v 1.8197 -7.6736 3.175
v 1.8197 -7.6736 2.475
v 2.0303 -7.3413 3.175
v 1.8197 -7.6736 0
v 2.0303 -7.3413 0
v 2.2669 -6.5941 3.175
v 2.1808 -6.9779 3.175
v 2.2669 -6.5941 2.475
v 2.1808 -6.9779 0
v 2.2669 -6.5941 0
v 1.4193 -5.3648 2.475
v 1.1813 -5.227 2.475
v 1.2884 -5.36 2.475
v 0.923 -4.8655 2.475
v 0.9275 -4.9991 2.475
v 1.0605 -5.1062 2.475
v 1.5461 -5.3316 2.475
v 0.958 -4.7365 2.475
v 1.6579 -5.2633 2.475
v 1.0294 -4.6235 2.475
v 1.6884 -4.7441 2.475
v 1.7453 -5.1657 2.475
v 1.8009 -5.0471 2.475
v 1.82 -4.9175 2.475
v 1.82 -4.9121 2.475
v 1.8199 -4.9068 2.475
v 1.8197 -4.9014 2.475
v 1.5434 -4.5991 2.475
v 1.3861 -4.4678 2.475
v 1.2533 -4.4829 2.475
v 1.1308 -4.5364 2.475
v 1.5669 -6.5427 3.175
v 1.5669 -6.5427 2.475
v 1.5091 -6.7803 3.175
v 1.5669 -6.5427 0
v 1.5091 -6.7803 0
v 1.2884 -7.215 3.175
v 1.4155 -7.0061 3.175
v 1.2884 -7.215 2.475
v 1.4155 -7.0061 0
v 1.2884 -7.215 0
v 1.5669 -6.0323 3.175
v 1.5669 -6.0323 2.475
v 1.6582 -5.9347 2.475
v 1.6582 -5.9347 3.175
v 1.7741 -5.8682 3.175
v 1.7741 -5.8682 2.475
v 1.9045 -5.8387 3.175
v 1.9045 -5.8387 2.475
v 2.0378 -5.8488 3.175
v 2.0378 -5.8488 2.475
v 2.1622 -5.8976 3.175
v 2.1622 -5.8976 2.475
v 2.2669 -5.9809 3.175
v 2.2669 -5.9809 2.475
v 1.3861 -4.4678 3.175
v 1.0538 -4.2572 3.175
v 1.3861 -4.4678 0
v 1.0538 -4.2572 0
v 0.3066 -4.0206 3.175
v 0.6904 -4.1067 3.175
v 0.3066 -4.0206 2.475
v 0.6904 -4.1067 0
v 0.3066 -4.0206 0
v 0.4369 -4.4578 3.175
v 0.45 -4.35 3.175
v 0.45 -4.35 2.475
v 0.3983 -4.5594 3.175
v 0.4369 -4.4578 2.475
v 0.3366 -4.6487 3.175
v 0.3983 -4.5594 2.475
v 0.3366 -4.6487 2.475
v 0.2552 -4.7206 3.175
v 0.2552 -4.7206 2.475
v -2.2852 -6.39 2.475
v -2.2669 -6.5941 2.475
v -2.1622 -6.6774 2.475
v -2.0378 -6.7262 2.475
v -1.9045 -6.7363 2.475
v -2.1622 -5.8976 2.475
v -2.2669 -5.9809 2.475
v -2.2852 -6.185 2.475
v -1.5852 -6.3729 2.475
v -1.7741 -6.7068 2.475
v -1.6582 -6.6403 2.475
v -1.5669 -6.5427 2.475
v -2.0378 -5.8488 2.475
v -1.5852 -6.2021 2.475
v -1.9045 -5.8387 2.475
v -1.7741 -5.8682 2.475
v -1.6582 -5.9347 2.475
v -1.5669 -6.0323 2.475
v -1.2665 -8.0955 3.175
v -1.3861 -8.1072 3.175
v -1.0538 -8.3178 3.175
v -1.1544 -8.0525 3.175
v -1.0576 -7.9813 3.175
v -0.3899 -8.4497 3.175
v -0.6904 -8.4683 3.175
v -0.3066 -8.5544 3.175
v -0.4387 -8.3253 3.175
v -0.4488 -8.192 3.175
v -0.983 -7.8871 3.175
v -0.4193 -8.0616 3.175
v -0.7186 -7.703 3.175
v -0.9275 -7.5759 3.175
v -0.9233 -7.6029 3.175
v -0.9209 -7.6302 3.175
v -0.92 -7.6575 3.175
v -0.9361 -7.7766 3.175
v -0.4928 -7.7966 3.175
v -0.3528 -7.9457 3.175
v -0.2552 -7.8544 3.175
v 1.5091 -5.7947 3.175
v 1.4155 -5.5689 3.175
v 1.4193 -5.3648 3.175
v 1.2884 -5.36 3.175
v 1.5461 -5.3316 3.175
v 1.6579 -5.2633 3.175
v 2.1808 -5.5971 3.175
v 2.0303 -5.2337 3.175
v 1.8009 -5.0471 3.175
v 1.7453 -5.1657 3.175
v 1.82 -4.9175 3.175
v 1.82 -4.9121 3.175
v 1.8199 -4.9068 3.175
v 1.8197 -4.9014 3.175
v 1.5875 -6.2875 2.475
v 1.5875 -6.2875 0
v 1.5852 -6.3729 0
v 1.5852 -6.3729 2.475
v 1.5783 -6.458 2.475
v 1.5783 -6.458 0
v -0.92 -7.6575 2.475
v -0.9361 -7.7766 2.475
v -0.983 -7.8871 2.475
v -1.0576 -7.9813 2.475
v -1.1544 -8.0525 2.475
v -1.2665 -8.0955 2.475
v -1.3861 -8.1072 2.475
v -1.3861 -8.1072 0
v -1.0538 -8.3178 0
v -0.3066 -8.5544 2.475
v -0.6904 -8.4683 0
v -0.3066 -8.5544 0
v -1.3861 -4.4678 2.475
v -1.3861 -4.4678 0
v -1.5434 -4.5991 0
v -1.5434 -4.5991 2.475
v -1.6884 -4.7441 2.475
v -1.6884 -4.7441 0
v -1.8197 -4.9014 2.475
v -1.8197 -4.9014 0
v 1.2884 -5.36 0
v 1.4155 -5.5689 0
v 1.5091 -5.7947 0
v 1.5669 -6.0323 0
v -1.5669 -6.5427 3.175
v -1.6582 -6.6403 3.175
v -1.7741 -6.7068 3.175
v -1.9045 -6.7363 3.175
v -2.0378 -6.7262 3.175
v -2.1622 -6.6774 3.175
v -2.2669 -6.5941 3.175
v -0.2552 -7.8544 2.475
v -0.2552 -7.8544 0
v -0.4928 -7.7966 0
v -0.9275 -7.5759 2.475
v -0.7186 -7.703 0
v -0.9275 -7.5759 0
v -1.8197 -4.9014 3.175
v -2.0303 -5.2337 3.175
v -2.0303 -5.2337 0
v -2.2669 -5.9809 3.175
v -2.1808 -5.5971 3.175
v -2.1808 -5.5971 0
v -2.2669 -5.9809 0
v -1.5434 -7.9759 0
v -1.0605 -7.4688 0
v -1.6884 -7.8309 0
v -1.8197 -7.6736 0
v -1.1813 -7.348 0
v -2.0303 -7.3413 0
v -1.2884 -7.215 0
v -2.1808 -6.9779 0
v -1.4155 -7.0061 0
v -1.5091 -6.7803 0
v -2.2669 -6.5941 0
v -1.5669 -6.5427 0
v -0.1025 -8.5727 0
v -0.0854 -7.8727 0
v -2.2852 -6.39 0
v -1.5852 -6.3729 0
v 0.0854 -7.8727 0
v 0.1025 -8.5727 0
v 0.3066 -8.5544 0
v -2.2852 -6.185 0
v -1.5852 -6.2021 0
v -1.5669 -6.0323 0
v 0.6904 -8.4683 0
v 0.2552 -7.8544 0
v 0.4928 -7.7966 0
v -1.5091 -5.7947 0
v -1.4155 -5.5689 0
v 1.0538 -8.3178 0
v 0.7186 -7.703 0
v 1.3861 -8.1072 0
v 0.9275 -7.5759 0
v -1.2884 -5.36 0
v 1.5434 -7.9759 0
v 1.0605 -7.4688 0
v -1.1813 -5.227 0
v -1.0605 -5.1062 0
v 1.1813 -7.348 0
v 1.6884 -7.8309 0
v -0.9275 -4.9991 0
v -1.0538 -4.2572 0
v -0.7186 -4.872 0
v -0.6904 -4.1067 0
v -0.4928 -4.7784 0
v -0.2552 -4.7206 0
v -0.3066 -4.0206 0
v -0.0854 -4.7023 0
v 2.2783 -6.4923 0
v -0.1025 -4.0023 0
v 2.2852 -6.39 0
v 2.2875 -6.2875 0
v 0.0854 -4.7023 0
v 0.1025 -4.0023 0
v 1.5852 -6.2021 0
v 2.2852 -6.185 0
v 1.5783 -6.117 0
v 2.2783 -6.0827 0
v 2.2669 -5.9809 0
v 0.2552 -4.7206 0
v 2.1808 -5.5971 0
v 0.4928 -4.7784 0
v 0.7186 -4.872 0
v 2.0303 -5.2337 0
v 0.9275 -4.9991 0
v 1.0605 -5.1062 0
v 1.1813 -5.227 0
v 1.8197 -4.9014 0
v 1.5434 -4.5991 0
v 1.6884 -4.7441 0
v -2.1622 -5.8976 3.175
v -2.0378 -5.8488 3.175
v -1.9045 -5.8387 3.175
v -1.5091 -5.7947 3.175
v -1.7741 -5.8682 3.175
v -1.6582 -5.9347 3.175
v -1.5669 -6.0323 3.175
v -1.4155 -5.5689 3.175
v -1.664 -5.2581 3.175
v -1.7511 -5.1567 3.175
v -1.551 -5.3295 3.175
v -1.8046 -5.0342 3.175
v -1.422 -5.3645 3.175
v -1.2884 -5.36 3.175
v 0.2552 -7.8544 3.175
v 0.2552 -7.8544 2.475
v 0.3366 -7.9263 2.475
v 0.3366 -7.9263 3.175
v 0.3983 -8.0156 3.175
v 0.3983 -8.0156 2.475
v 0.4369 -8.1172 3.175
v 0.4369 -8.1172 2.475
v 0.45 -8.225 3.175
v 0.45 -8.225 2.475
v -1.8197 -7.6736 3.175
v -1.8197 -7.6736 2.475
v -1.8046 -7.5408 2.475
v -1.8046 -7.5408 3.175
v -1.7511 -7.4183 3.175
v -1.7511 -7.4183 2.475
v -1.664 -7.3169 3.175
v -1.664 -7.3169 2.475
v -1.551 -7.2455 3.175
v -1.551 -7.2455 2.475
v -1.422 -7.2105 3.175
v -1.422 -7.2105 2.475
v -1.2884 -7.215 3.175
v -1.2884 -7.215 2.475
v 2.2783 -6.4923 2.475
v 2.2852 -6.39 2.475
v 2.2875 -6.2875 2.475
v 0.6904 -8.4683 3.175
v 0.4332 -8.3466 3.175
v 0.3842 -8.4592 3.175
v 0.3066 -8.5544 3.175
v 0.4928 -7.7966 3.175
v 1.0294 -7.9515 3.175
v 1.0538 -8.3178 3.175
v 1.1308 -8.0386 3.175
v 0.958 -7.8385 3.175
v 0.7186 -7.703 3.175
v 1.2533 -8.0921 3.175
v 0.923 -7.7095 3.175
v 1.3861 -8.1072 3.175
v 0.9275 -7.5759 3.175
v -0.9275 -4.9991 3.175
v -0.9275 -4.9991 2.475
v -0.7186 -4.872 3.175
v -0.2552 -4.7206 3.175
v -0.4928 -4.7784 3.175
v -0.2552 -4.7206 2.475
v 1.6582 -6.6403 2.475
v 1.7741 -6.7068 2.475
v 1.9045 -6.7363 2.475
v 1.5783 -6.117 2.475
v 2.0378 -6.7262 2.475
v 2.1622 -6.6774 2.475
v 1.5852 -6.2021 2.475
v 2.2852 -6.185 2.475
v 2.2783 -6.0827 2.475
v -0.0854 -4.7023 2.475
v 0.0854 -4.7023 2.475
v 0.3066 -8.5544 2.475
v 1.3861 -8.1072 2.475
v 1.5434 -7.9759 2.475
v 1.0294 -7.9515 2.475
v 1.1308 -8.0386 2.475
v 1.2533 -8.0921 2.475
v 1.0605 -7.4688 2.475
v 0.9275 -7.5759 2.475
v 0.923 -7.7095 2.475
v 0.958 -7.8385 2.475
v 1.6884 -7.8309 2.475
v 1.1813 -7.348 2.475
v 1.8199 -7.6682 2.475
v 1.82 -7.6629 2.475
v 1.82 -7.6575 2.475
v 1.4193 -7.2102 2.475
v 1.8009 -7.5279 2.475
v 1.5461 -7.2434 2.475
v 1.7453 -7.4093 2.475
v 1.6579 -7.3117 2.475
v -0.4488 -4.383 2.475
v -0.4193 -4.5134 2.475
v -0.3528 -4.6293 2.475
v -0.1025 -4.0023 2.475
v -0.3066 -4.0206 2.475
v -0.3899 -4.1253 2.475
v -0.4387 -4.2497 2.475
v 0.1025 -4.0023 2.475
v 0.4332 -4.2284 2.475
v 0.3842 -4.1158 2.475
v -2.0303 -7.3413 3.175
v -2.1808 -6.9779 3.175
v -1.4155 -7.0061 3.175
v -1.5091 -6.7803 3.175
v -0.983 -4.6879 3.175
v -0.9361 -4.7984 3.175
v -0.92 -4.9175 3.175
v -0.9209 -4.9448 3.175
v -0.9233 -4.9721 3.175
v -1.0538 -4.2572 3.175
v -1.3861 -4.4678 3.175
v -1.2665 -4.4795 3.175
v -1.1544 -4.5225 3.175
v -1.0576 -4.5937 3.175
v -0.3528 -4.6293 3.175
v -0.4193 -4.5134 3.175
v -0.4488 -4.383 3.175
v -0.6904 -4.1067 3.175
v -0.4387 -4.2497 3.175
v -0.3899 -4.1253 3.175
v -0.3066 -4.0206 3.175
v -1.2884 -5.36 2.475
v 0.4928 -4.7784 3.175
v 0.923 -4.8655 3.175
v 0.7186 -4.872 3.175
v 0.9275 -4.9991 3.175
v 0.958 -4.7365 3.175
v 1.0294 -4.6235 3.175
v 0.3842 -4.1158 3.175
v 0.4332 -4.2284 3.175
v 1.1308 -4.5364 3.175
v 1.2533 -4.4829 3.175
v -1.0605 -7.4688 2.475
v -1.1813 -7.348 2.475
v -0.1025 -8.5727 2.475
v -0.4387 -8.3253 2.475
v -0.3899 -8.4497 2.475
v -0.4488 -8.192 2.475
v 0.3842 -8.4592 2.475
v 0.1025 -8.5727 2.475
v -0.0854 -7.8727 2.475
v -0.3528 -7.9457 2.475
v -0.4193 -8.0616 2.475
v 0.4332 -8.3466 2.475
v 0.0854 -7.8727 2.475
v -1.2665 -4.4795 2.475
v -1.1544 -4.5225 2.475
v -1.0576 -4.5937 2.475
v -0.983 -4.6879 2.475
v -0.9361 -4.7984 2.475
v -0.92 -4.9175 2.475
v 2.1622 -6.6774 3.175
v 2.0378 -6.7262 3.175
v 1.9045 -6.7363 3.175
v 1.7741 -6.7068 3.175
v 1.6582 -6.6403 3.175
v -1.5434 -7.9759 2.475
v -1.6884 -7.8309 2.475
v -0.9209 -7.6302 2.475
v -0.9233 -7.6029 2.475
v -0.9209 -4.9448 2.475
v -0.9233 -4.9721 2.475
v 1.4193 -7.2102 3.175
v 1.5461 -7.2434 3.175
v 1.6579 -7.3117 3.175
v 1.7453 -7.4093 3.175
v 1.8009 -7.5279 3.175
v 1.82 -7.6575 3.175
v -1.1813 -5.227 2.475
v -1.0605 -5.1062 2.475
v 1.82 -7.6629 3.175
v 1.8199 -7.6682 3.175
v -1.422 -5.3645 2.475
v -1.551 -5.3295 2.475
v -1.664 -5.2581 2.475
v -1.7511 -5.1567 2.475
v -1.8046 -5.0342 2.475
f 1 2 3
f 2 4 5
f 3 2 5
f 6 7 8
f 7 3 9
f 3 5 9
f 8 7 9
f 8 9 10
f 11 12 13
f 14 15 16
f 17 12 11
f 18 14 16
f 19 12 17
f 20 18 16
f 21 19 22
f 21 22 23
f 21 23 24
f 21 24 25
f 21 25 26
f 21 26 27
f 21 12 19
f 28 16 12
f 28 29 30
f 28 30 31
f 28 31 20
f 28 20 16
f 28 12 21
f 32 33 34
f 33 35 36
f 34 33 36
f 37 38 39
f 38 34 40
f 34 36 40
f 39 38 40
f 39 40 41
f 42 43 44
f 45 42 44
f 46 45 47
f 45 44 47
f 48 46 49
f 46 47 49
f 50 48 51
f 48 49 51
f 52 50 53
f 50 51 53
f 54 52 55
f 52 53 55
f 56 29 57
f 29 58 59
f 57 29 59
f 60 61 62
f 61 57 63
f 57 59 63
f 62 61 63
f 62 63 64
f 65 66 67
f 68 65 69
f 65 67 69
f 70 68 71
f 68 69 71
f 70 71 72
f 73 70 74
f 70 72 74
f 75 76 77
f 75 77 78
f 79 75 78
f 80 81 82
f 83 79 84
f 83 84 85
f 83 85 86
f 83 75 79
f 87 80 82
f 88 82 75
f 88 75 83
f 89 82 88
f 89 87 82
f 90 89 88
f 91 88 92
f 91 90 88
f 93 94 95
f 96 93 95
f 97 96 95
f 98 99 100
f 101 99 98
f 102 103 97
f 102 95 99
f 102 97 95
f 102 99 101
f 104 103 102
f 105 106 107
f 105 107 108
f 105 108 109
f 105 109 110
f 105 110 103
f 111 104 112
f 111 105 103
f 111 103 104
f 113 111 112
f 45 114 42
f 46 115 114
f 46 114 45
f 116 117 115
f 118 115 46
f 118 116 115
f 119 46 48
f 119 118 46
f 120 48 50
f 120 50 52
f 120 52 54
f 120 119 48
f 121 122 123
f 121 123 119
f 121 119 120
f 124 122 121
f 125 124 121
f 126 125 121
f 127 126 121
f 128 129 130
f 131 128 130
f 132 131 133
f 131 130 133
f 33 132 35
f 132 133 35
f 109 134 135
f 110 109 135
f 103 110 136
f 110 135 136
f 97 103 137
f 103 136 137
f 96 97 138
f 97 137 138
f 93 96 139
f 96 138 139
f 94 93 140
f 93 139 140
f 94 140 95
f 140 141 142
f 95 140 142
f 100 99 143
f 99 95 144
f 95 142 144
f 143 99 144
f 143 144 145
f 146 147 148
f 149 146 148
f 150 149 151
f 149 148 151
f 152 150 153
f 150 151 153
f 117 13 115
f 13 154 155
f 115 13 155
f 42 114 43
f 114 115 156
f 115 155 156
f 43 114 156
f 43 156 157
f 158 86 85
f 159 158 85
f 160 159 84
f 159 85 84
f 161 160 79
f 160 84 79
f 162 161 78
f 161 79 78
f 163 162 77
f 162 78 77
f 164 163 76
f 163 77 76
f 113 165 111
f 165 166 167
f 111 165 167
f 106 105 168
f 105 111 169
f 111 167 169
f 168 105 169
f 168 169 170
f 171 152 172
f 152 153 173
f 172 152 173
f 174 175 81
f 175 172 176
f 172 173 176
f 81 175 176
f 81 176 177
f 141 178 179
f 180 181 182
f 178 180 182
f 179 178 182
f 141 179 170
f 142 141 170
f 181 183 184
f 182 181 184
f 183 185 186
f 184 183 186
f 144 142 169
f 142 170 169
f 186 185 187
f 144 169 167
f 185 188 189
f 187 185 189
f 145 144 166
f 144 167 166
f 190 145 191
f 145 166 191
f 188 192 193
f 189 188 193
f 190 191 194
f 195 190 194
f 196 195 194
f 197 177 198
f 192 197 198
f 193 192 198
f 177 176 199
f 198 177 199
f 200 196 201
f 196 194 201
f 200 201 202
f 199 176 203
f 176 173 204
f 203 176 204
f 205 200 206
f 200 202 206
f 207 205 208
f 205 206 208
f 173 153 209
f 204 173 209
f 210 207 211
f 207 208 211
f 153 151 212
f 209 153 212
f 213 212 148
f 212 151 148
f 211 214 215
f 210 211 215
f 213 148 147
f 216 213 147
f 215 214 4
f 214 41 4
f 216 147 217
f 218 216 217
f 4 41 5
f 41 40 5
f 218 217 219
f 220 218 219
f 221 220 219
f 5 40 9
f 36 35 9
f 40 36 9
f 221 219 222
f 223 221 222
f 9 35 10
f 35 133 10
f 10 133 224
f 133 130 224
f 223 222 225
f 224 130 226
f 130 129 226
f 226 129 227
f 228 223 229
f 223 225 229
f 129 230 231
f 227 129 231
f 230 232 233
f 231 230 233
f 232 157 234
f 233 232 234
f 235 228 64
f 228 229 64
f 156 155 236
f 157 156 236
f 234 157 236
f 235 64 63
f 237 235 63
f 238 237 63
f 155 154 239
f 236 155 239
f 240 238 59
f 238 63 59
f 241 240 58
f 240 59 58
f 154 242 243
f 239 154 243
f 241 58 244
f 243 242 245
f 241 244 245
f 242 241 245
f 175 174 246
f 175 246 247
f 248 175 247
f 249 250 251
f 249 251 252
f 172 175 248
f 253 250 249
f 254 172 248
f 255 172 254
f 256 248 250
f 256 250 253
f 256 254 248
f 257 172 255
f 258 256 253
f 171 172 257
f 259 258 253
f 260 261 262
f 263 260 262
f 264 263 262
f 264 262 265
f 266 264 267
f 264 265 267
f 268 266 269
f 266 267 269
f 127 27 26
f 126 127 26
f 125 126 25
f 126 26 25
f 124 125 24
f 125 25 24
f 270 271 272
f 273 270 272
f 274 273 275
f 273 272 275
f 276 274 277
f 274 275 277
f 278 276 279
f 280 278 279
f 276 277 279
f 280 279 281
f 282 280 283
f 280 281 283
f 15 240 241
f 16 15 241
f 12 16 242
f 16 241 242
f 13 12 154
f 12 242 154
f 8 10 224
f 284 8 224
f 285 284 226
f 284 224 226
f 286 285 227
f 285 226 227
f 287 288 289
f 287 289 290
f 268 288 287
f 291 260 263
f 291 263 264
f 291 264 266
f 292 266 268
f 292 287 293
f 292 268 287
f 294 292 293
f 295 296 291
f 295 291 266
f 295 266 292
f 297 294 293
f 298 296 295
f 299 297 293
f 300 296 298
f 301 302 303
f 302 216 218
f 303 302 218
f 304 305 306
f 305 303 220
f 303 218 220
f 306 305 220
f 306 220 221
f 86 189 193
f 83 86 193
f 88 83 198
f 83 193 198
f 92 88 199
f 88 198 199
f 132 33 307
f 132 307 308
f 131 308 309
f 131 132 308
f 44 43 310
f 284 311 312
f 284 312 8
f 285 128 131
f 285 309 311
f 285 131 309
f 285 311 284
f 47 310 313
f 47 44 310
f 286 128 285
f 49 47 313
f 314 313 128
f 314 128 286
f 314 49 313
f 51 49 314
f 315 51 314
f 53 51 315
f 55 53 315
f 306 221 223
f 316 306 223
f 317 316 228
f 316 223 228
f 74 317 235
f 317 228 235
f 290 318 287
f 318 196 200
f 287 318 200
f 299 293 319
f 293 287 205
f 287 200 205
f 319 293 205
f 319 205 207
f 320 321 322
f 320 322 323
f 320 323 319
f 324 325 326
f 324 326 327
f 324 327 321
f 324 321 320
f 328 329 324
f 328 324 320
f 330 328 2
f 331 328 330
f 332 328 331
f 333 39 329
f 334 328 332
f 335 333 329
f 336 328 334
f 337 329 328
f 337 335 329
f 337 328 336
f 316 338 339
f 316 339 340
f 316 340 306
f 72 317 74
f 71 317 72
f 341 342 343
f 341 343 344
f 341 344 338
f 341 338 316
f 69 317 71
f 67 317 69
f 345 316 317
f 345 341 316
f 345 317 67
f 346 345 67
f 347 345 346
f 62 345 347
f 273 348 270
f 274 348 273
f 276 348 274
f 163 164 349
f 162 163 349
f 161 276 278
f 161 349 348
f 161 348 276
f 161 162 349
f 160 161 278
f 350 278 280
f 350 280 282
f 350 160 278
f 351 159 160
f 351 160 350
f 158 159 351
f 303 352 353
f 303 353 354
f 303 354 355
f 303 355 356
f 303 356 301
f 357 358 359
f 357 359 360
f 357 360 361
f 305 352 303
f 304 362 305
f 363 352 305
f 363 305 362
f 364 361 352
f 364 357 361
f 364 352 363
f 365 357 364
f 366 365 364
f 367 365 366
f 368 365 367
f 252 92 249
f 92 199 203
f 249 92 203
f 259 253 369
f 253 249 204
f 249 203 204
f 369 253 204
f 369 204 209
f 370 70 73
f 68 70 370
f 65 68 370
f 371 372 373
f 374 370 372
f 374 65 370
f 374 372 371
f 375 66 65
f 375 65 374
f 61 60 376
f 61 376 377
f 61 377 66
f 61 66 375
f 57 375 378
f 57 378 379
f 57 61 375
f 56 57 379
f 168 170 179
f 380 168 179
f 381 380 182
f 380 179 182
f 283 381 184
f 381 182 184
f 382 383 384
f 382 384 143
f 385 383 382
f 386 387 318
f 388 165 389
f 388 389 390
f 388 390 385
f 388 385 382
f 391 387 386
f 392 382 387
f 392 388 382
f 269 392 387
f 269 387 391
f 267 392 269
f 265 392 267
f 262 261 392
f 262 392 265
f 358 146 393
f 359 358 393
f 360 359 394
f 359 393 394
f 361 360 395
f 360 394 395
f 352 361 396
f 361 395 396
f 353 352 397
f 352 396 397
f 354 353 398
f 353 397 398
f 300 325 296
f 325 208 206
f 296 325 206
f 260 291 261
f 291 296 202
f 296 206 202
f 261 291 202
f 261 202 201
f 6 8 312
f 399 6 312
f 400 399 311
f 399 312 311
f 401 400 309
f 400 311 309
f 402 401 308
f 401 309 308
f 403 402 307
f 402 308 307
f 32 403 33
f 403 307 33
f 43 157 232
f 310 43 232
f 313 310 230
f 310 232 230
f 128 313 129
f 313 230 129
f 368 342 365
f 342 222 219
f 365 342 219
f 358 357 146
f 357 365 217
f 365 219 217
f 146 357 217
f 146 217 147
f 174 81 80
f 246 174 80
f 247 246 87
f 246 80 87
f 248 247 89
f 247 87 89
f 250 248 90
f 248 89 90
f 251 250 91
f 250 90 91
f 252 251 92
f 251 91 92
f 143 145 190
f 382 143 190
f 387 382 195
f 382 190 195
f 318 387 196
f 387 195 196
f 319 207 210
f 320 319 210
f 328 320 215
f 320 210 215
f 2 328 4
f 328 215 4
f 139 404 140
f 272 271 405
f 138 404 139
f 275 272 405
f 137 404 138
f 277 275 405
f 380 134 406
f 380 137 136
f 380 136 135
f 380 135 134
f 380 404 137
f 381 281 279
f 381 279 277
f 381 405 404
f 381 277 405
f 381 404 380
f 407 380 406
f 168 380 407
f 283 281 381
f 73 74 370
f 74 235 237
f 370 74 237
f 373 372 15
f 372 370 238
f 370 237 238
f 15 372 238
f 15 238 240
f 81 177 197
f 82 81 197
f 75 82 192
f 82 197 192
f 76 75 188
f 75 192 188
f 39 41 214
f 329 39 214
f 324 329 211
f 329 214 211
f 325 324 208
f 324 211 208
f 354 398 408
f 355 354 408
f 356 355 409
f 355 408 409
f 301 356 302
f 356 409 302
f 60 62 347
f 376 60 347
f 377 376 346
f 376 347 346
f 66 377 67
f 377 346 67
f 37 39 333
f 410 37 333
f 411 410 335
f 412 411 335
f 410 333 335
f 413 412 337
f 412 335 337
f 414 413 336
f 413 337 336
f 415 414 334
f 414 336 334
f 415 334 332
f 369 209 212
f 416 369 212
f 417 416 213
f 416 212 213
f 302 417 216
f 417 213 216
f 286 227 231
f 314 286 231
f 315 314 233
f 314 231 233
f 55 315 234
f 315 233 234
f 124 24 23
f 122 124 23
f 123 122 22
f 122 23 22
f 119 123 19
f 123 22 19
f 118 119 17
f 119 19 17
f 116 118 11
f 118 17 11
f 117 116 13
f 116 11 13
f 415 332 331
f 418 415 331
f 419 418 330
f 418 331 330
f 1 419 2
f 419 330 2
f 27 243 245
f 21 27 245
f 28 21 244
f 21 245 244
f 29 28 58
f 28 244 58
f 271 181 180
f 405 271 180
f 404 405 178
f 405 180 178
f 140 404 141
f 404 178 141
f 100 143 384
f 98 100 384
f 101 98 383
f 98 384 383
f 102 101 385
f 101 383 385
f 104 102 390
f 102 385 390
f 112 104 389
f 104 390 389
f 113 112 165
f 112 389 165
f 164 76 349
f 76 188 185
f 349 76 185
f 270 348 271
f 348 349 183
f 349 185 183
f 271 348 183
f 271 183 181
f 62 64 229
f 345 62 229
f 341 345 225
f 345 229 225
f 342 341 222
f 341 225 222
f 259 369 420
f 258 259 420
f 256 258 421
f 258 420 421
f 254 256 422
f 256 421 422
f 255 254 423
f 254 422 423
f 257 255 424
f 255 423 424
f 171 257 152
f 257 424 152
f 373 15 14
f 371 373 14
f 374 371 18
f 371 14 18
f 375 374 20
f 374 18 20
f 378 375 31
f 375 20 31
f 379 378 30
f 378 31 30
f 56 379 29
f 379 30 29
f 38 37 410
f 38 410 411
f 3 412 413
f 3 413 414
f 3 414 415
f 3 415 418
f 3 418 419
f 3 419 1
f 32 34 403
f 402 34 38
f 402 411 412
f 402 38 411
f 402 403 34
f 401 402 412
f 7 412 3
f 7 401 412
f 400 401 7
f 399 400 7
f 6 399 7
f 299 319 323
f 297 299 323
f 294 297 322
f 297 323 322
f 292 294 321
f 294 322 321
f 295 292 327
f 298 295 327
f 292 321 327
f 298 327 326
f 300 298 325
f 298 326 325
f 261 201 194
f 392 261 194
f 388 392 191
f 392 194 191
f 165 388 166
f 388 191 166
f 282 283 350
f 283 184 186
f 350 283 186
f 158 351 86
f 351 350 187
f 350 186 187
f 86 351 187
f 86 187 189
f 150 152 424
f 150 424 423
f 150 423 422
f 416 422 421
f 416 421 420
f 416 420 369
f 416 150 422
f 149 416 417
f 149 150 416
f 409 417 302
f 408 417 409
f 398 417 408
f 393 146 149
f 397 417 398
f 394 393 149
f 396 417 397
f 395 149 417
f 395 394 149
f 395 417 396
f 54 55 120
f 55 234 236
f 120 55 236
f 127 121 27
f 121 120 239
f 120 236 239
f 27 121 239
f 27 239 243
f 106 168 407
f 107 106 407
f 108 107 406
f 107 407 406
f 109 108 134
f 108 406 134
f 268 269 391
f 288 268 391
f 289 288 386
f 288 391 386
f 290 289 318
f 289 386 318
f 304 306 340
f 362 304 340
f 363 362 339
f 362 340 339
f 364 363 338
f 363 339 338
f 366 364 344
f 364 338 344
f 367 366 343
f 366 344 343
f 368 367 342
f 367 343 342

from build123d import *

# Parameters (mm, degrees)
F1_DEPTH = 3.175
F2_DEPTH = 2.475


# Not quite as in the source:
# - a length typed as a fraction of an inch, garbled in the dataset ("3 / 203.2 mm" for 3/8 in), is restored


with BuildPart() as f1:
    # F0 (on Top) → F1 (new body)
    with BuildSketch(Plane.XY):
        with BuildLine():
            ThreePointArc((-1.5668548387, -6.0323095527), (-1.4666587579, -5.6799900511), (-1.2883805774, -5.3600132142))
            ThreePointArc((-1.2883805774, -5.3600132142), (-1.6640391224, -5.2581452502), (-1.8197325394, -4.9014156826))
            ThreePointArc((-1.8197325394, -4.9014156826), (-2.1133744306, -5.4121116485), (-2.2668548387, -5.9808644016))
            ThreePointArc((-2.2668548387, -5.9808644016), (-1.9045170714, -5.8387103762), (-1.5668548387, -6.0323095527))
        make_face()
    extrude(amount=F1_DEPTH)



with BuildPart() as f1b:
    # F0 (on Top) → F1, piece 2 (new body)
    with BuildSketch(Plane.XY):
        with BuildLine():
            ThreePointArc((-0.9274867858, -4.9991194226), (-0.6075099489, -4.8208412421), (-0.2551904473, -4.7206451613))
            ThreePointArc((-0.2551904473, -4.7206451613), (-0.4487896238, -4.3829829286), (-0.3066355984, -4.0206451613))
            ThreePointArc((-0.3066355984, -4.0206451613), (-0.8753883515, -4.1741255694), (-1.3860843174, -4.4677674606))
            ThreePointArc((-1.3860843174, -4.4677674606), (-1.0575527647, -4.5936525568), (-0.9200193885, -4.9174806115))
            ThreePointArc((-0.9200193885, -4.9174806115), (-0.9218901264, -4.9584704197), (-0.9274867858, -4.9991194226))
        make_face()
    extrude(amount=F1_DEPTH)


with BuildPart() as f1c:
    # F0 (on Top) → F1, piece 3 (new body)
    with BuildSketch(Plane.XY):
        with BuildLine():
            ThreePointArc((0.2551904473, -4.7206451613), (0.6075099489, -4.8208412421), (0.9274867858, -4.9991194226))
            ThreePointArc((0.9274867858, -4.9991194226), (1.0293547498, -4.6234608776), (1.3860843174, -4.4677674606))
            ThreePointArc((1.3860843174, -4.4677674606), (0.8753883515, -4.1741255694), (0.3066355984, -4.0206451613))
            ThreePointArc((0.3066355984, -4.0206451613), (0.4126051498, -4.1703976883), (0.45, -4.35))
            ThreePointArc((0.45, -4.35), (0.3983313328, -4.559361289), (0.2551904473, -4.7206451613))
        make_face()
    extrude(amount=F1_DEPTH)


with BuildPart() as f1d:
    # F0 (on Top) → F1, piece 4 (new body)
    with BuildSketch(Plane.XY):
        with BuildLine():
            ThreePointArc((1.2883805774, -5.3600132142), (1.4666587579, -5.6799900511), (1.5668548387, -6.0323095527))
            ThreePointArc((1.5668548387, -6.0323095527), (1.9045170714, -5.8387103762), (2.2668548387, -5.9808644016))
            ThreePointArc((2.2668548387, -5.9808644016), (2.1133744306, -5.4121116485), (1.8197325394, -4.9014156826))
            ThreePointArc((1.8197325394, -4.9014156826), (1.8199476706, -4.9094468667), (1.8200193885, -4.9174806115))
            ThreePointArc((1.8200193885, -4.9174806115), (1.6579104573, -5.2633400229), (1.2883805774, -5.3600132142))
        make_face()
    extrude(amount=F1_DEPTH)


with BuildPart() as f1e:
    # F0 (on Top) → F1, piece 5 (new body)
    with BuildSketch(Plane.XY):
        with BuildLine():
            ThreePointArc((2.2668548387, -6.5941355984), (1.9045170714, -6.7362896238), (1.5668548387, -6.5426904473))
            ThreePointArc((1.5668548387, -6.5426904473), (1.4666587579, -6.8950099489), (1.2883805774, -7.2149867858))
            ThreePointArc((1.2883805774, -7.2149867858), (1.6579104573, -7.3116599771), (1.8200193885, -7.6575193885))
            ThreePointArc((1.8200193885, -7.6575193885), (1.8199476706, -7.6655531333), (1.8197325394, -7.6735843174))
            ThreePointArc((1.8197325394, -7.6735843174), (2.1133744306, -7.1628883515), (2.2668548387, -6.5941355984))
        make_face()
    extrude(amount=F1_DEPTH)


with BuildPart() as f1f:
    # F0 (on Top) → F1, piece 6 (new body)
    with BuildSketch(Plane.XY):
        with BuildLine():
            ThreePointArc((1.3860843174, -8.1072325394), (1.0293547498, -7.9515391224), (0.9274867858, -7.5758805774))
            ThreePointArc((0.9274867858, -7.5758805774), (0.6075099489, -7.7541587579), (0.2551904473, -7.8543548387))
            ThreePointArc((0.2551904473, -7.8543548387), (0.3983313328, -8.015638711), (0.45, -8.225))
            ThreePointArc((0.45, -8.225), (0.4126051498, -8.4046023117), (0.3066355984, -8.5543548387))
            ThreePointArc((0.3066355984, -8.5543548387), (0.8753883515, -8.4008744306), (1.3860843174, -8.1072325394))
        make_face()
    extrude(amount=F1_DEPTH)


with BuildPart() as f1g:
    # F0 (on Top) → F1, piece 7 (new body)
    with BuildSketch(Plane.XY):
        with BuildLine():
            ThreePointArc((-0.3066355984, -8.5543548387), (-0.4487896238, -8.1920170714), (-0.2551904473, -7.8543548387))
            ThreePointArc((-0.2551904473, -7.8543548387), (-0.6075099489, -7.7541587579), (-0.9274867858, -7.5758805774))
            ThreePointArc((-0.9274867858, -7.5758805774), (-0.9218901264, -7.6165295803), (-0.9200193885, -7.6575193885))
            ThreePointArc((-0.9200193885, -7.6575193885), (-1.0575527647, -7.9813474432), (-1.3860843174, -8.1072325394))
            ThreePointArc((-1.3860843174, -8.1072325394), (-0.8753883515, -8.4008744306), (-0.3066355984, -8.5543548387))
        make_face()
    extrude(amount=F1_DEPTH)


with BuildPart() as f1h:
    # F0 (on Top) → F1, piece 8 (new body)
    with BuildSketch(Plane.XY):
        with BuildLine():
            ThreePointArc((-1.8197325394, -7.6735843174), (-1.6640391224, -7.3168547498), (-1.2883805774, -7.2149867858))
            ThreePointArc((-1.2883805774, -7.2149867858), (-1.4666587579, -6.8950099489), (-1.5668548387, -6.5426904473))
            ThreePointArc((-1.5668548387, -6.5426904473), (-1.9045170714, -6.7362896238), (-2.2668548387, -6.5941355984))
            ThreePointArc((-2.2668548387, -6.5941355984), (-2.1133744306, -7.1628883515), (-1.8197325394, -7.6735843174))
        make_face()
    extrude(amount=F1_DEPTH)


with BuildPart() as f1_1:
    add(f1.part)

    add(f1b.part)  # F2 merges F1b

    add(f1c.part)  # F2 merges F1c

    add(f1d.part)  # F2 merges F1d

    add(f1e.part)  # F2 merges F1e

    add(f1f.part)  # F2 merges F1f

    add(f1g.part)  # F2 merges F1g

    add(f1h.part)  # F2 merges F1h
    # F0 (on Top) → F2 (join)
    with BuildSketch(Plane.XY):
        with BuildLine():
            ThreePointArc((-1.2883805774, -5.3600132142), (-1.1225320151, -5.1649679849), (-0.9274867858, -4.9991194226))
            ThreePointArc((-0.9274867858, -4.9991194226), (-0.9218901264, -4.9584704197), (-0.9200193885, -4.9174806115))
            ThreePointArc((-0.9200193885, -4.9174806115), (-1.0575527647, -4.5936525568), (-1.3860843174, -4.4677674606))
            ThreePointArc((-1.3860843174, -4.4677674606), (-1.617506762, -4.669993238), (-1.8197325394, -4.9014156826))
            ThreePointArc((-1.8197325394, -4.9014156826), (-1.6640391224, -5.2581452502), (-1.2883805774, -5.3600132142))
        make_face()
        with BuildLine():
            ThreePointArc((-0.2551904473, -4.7206451613), (0, -4.7), (0.2551904473, -4.7206451613))
            ThreePointArc((0.2551904473, -4.7206451613), (0.3983313328, -4.559361289), (0.45, -4.35))
            ThreePointArc((0.45, -4.35), (0.4126051498, -4.1703976883), (0.3066355984, -4.0206451613))
            ThreePointArc((0.3066355984, -4.0206451613), (0, -4), (-0.3066355984, -4.0206451613))
            ThreePointArc((-0.3066355984, -4.0206451613), (-0.4487896238, -4.3829829286), (-0.2551904473, -4.7206451613))
        make_face()
        with BuildLine():
            ThreePointArc((0.9274867858, -4.9991194226), (1.1225320151, -5.1649679849), (1.2883805774, -5.3600132142))
            ThreePointArc((1.2883805774, -5.3600132142), (1.6579104573, -5.2633400229), (1.8200193885, -4.9174806115))
            ThreePointArc((1.8200193885, -4.9174806115), (1.8199476706, -4.9094468667), (1.8197325394, -4.9014156826))
            ThreePointArc((1.8197325394, -4.9014156826), (1.617506762, -4.669993238), (1.3860843174, -4.4677674606))
            ThreePointArc((1.3860843174, -4.4677674606), (1.0293547498, -4.6234608776), (0.9274867858, -4.9991194226))
        make_face()
        with BuildLine():
            ThreePointArc((1.5668548387, -6.0323095527), (1.5823302921, -6.1594879038), (1.5875, -6.2875))
            ThreePointArc((1.5875, -6.2875), (1.5823302921, -6.4155120962), (1.5668548387, -6.5426904473))
            ThreePointArc((1.5668548387, -6.5426904473), (1.9045170714, -6.7362896238), (2.2668548387, -6.5941355984))
            ThreePointArc((2.2668548387, -6.5941355984), (2.2823328738, -6.4411649056), (2.2875, -6.2875))
            ThreePointArc((2.2875, -6.2875), (2.2823328738, -6.1338350944), (2.2668548387, -5.9808644016))
            ThreePointArc((2.2668548387, -5.9808644016), (1.9045170714, -5.8387103762), (1.5668548387, -6.0323095527))
        make_face()
        with BuildLine():
            ThreePointArc((1.8200193885, -7.6575193885), (1.6579104573, -7.3116599771), (1.2883805774, -7.2149867858))
            ThreePointArc((1.2883805774, -7.2149867858), (1.1225320151, -7.4100320151), (0.9274867858, -7.5758805774))
            ThreePointArc((0.9274867858, -7.5758805774), (1.0293547498, -7.9515391224), (1.3860843174, -8.1072325394))
            ThreePointArc((1.3860843174, -8.1072325394), (1.617506762, -7.905006762), (1.8197325394, -7.6735843174))
            ThreePointArc((1.8197325394, -7.6735843174), (1.8199476706, -7.6655531333), (1.8200193885, -7.6575193885))
        make_face()
        with BuildLine():
            ThreePointArc((0.45, -8.225), (0.3983313328, -8.015638711), (0.2551904473, -7.8543548387))
            ThreePointArc((0.2551904473, -7.8543548387), (0, -7.875), (-0.2551904473, -7.8543548387))
            ThreePointArc((-0.2551904473, -7.8543548387), (-0.4487896238, -8.1920170714), (-0.3066355984, -8.5543548387))
            ThreePointArc((-0.3066355984, -8.5543548387), (0, -8.575), (0.3066355984, -8.5543548387))
            ThreePointArc((0.3066355984, -8.5543548387), (0.4126051498, -8.4046023117), (0.45, -8.225))
        make_face()
        with BuildLine():
            ThreePointArc((-0.9200193885, -7.6575193885), (-0.9218901264, -7.6165295803), (-0.9274867858, -7.5758805774))
            ThreePointArc((-0.9274867858, -7.5758805774), (-1.1225320151, -7.4100320151), (-1.2883805774, -7.2149867858))
            ThreePointArc((-1.2883805774, -7.2149867858), (-1.6640391224, -7.3168547498), (-1.8197325394, -7.6735843174))
            ThreePointArc((-1.8197325394, -7.6735843174), (-1.617506762, -7.905006762), (-1.3860843174, -8.1072325394))
            ThreePointArc((-1.3860843174, -8.1072325394), (-1.0575527647, -7.9813474432), (-0.9200193885, -7.6575193885))
        make_face()
        with BuildLine():
            ThreePointArc((-1.5668548387, -6.5426904473), (-1.5875, -6.2875), (-1.5668548387, -6.0323095527))
            ThreePointArc((-1.5668548387, -6.0323095527), (-1.9045170714, -5.8387103762), (-2.2668548387, -5.9808644016))
            ThreePointArc((-2.2668548387, -5.9808644016), (-2.2875, -6.2875), (-2.2668548387, -6.5941355984))
            ThreePointArc((-2.2668548387, -6.5941355984), (-1.9045170714, -6.7362896238), (-1.5668548387, -6.5426904473))
        make_face()
    extrude(amount=F2_DEPTH)


solid = f1_1.part
